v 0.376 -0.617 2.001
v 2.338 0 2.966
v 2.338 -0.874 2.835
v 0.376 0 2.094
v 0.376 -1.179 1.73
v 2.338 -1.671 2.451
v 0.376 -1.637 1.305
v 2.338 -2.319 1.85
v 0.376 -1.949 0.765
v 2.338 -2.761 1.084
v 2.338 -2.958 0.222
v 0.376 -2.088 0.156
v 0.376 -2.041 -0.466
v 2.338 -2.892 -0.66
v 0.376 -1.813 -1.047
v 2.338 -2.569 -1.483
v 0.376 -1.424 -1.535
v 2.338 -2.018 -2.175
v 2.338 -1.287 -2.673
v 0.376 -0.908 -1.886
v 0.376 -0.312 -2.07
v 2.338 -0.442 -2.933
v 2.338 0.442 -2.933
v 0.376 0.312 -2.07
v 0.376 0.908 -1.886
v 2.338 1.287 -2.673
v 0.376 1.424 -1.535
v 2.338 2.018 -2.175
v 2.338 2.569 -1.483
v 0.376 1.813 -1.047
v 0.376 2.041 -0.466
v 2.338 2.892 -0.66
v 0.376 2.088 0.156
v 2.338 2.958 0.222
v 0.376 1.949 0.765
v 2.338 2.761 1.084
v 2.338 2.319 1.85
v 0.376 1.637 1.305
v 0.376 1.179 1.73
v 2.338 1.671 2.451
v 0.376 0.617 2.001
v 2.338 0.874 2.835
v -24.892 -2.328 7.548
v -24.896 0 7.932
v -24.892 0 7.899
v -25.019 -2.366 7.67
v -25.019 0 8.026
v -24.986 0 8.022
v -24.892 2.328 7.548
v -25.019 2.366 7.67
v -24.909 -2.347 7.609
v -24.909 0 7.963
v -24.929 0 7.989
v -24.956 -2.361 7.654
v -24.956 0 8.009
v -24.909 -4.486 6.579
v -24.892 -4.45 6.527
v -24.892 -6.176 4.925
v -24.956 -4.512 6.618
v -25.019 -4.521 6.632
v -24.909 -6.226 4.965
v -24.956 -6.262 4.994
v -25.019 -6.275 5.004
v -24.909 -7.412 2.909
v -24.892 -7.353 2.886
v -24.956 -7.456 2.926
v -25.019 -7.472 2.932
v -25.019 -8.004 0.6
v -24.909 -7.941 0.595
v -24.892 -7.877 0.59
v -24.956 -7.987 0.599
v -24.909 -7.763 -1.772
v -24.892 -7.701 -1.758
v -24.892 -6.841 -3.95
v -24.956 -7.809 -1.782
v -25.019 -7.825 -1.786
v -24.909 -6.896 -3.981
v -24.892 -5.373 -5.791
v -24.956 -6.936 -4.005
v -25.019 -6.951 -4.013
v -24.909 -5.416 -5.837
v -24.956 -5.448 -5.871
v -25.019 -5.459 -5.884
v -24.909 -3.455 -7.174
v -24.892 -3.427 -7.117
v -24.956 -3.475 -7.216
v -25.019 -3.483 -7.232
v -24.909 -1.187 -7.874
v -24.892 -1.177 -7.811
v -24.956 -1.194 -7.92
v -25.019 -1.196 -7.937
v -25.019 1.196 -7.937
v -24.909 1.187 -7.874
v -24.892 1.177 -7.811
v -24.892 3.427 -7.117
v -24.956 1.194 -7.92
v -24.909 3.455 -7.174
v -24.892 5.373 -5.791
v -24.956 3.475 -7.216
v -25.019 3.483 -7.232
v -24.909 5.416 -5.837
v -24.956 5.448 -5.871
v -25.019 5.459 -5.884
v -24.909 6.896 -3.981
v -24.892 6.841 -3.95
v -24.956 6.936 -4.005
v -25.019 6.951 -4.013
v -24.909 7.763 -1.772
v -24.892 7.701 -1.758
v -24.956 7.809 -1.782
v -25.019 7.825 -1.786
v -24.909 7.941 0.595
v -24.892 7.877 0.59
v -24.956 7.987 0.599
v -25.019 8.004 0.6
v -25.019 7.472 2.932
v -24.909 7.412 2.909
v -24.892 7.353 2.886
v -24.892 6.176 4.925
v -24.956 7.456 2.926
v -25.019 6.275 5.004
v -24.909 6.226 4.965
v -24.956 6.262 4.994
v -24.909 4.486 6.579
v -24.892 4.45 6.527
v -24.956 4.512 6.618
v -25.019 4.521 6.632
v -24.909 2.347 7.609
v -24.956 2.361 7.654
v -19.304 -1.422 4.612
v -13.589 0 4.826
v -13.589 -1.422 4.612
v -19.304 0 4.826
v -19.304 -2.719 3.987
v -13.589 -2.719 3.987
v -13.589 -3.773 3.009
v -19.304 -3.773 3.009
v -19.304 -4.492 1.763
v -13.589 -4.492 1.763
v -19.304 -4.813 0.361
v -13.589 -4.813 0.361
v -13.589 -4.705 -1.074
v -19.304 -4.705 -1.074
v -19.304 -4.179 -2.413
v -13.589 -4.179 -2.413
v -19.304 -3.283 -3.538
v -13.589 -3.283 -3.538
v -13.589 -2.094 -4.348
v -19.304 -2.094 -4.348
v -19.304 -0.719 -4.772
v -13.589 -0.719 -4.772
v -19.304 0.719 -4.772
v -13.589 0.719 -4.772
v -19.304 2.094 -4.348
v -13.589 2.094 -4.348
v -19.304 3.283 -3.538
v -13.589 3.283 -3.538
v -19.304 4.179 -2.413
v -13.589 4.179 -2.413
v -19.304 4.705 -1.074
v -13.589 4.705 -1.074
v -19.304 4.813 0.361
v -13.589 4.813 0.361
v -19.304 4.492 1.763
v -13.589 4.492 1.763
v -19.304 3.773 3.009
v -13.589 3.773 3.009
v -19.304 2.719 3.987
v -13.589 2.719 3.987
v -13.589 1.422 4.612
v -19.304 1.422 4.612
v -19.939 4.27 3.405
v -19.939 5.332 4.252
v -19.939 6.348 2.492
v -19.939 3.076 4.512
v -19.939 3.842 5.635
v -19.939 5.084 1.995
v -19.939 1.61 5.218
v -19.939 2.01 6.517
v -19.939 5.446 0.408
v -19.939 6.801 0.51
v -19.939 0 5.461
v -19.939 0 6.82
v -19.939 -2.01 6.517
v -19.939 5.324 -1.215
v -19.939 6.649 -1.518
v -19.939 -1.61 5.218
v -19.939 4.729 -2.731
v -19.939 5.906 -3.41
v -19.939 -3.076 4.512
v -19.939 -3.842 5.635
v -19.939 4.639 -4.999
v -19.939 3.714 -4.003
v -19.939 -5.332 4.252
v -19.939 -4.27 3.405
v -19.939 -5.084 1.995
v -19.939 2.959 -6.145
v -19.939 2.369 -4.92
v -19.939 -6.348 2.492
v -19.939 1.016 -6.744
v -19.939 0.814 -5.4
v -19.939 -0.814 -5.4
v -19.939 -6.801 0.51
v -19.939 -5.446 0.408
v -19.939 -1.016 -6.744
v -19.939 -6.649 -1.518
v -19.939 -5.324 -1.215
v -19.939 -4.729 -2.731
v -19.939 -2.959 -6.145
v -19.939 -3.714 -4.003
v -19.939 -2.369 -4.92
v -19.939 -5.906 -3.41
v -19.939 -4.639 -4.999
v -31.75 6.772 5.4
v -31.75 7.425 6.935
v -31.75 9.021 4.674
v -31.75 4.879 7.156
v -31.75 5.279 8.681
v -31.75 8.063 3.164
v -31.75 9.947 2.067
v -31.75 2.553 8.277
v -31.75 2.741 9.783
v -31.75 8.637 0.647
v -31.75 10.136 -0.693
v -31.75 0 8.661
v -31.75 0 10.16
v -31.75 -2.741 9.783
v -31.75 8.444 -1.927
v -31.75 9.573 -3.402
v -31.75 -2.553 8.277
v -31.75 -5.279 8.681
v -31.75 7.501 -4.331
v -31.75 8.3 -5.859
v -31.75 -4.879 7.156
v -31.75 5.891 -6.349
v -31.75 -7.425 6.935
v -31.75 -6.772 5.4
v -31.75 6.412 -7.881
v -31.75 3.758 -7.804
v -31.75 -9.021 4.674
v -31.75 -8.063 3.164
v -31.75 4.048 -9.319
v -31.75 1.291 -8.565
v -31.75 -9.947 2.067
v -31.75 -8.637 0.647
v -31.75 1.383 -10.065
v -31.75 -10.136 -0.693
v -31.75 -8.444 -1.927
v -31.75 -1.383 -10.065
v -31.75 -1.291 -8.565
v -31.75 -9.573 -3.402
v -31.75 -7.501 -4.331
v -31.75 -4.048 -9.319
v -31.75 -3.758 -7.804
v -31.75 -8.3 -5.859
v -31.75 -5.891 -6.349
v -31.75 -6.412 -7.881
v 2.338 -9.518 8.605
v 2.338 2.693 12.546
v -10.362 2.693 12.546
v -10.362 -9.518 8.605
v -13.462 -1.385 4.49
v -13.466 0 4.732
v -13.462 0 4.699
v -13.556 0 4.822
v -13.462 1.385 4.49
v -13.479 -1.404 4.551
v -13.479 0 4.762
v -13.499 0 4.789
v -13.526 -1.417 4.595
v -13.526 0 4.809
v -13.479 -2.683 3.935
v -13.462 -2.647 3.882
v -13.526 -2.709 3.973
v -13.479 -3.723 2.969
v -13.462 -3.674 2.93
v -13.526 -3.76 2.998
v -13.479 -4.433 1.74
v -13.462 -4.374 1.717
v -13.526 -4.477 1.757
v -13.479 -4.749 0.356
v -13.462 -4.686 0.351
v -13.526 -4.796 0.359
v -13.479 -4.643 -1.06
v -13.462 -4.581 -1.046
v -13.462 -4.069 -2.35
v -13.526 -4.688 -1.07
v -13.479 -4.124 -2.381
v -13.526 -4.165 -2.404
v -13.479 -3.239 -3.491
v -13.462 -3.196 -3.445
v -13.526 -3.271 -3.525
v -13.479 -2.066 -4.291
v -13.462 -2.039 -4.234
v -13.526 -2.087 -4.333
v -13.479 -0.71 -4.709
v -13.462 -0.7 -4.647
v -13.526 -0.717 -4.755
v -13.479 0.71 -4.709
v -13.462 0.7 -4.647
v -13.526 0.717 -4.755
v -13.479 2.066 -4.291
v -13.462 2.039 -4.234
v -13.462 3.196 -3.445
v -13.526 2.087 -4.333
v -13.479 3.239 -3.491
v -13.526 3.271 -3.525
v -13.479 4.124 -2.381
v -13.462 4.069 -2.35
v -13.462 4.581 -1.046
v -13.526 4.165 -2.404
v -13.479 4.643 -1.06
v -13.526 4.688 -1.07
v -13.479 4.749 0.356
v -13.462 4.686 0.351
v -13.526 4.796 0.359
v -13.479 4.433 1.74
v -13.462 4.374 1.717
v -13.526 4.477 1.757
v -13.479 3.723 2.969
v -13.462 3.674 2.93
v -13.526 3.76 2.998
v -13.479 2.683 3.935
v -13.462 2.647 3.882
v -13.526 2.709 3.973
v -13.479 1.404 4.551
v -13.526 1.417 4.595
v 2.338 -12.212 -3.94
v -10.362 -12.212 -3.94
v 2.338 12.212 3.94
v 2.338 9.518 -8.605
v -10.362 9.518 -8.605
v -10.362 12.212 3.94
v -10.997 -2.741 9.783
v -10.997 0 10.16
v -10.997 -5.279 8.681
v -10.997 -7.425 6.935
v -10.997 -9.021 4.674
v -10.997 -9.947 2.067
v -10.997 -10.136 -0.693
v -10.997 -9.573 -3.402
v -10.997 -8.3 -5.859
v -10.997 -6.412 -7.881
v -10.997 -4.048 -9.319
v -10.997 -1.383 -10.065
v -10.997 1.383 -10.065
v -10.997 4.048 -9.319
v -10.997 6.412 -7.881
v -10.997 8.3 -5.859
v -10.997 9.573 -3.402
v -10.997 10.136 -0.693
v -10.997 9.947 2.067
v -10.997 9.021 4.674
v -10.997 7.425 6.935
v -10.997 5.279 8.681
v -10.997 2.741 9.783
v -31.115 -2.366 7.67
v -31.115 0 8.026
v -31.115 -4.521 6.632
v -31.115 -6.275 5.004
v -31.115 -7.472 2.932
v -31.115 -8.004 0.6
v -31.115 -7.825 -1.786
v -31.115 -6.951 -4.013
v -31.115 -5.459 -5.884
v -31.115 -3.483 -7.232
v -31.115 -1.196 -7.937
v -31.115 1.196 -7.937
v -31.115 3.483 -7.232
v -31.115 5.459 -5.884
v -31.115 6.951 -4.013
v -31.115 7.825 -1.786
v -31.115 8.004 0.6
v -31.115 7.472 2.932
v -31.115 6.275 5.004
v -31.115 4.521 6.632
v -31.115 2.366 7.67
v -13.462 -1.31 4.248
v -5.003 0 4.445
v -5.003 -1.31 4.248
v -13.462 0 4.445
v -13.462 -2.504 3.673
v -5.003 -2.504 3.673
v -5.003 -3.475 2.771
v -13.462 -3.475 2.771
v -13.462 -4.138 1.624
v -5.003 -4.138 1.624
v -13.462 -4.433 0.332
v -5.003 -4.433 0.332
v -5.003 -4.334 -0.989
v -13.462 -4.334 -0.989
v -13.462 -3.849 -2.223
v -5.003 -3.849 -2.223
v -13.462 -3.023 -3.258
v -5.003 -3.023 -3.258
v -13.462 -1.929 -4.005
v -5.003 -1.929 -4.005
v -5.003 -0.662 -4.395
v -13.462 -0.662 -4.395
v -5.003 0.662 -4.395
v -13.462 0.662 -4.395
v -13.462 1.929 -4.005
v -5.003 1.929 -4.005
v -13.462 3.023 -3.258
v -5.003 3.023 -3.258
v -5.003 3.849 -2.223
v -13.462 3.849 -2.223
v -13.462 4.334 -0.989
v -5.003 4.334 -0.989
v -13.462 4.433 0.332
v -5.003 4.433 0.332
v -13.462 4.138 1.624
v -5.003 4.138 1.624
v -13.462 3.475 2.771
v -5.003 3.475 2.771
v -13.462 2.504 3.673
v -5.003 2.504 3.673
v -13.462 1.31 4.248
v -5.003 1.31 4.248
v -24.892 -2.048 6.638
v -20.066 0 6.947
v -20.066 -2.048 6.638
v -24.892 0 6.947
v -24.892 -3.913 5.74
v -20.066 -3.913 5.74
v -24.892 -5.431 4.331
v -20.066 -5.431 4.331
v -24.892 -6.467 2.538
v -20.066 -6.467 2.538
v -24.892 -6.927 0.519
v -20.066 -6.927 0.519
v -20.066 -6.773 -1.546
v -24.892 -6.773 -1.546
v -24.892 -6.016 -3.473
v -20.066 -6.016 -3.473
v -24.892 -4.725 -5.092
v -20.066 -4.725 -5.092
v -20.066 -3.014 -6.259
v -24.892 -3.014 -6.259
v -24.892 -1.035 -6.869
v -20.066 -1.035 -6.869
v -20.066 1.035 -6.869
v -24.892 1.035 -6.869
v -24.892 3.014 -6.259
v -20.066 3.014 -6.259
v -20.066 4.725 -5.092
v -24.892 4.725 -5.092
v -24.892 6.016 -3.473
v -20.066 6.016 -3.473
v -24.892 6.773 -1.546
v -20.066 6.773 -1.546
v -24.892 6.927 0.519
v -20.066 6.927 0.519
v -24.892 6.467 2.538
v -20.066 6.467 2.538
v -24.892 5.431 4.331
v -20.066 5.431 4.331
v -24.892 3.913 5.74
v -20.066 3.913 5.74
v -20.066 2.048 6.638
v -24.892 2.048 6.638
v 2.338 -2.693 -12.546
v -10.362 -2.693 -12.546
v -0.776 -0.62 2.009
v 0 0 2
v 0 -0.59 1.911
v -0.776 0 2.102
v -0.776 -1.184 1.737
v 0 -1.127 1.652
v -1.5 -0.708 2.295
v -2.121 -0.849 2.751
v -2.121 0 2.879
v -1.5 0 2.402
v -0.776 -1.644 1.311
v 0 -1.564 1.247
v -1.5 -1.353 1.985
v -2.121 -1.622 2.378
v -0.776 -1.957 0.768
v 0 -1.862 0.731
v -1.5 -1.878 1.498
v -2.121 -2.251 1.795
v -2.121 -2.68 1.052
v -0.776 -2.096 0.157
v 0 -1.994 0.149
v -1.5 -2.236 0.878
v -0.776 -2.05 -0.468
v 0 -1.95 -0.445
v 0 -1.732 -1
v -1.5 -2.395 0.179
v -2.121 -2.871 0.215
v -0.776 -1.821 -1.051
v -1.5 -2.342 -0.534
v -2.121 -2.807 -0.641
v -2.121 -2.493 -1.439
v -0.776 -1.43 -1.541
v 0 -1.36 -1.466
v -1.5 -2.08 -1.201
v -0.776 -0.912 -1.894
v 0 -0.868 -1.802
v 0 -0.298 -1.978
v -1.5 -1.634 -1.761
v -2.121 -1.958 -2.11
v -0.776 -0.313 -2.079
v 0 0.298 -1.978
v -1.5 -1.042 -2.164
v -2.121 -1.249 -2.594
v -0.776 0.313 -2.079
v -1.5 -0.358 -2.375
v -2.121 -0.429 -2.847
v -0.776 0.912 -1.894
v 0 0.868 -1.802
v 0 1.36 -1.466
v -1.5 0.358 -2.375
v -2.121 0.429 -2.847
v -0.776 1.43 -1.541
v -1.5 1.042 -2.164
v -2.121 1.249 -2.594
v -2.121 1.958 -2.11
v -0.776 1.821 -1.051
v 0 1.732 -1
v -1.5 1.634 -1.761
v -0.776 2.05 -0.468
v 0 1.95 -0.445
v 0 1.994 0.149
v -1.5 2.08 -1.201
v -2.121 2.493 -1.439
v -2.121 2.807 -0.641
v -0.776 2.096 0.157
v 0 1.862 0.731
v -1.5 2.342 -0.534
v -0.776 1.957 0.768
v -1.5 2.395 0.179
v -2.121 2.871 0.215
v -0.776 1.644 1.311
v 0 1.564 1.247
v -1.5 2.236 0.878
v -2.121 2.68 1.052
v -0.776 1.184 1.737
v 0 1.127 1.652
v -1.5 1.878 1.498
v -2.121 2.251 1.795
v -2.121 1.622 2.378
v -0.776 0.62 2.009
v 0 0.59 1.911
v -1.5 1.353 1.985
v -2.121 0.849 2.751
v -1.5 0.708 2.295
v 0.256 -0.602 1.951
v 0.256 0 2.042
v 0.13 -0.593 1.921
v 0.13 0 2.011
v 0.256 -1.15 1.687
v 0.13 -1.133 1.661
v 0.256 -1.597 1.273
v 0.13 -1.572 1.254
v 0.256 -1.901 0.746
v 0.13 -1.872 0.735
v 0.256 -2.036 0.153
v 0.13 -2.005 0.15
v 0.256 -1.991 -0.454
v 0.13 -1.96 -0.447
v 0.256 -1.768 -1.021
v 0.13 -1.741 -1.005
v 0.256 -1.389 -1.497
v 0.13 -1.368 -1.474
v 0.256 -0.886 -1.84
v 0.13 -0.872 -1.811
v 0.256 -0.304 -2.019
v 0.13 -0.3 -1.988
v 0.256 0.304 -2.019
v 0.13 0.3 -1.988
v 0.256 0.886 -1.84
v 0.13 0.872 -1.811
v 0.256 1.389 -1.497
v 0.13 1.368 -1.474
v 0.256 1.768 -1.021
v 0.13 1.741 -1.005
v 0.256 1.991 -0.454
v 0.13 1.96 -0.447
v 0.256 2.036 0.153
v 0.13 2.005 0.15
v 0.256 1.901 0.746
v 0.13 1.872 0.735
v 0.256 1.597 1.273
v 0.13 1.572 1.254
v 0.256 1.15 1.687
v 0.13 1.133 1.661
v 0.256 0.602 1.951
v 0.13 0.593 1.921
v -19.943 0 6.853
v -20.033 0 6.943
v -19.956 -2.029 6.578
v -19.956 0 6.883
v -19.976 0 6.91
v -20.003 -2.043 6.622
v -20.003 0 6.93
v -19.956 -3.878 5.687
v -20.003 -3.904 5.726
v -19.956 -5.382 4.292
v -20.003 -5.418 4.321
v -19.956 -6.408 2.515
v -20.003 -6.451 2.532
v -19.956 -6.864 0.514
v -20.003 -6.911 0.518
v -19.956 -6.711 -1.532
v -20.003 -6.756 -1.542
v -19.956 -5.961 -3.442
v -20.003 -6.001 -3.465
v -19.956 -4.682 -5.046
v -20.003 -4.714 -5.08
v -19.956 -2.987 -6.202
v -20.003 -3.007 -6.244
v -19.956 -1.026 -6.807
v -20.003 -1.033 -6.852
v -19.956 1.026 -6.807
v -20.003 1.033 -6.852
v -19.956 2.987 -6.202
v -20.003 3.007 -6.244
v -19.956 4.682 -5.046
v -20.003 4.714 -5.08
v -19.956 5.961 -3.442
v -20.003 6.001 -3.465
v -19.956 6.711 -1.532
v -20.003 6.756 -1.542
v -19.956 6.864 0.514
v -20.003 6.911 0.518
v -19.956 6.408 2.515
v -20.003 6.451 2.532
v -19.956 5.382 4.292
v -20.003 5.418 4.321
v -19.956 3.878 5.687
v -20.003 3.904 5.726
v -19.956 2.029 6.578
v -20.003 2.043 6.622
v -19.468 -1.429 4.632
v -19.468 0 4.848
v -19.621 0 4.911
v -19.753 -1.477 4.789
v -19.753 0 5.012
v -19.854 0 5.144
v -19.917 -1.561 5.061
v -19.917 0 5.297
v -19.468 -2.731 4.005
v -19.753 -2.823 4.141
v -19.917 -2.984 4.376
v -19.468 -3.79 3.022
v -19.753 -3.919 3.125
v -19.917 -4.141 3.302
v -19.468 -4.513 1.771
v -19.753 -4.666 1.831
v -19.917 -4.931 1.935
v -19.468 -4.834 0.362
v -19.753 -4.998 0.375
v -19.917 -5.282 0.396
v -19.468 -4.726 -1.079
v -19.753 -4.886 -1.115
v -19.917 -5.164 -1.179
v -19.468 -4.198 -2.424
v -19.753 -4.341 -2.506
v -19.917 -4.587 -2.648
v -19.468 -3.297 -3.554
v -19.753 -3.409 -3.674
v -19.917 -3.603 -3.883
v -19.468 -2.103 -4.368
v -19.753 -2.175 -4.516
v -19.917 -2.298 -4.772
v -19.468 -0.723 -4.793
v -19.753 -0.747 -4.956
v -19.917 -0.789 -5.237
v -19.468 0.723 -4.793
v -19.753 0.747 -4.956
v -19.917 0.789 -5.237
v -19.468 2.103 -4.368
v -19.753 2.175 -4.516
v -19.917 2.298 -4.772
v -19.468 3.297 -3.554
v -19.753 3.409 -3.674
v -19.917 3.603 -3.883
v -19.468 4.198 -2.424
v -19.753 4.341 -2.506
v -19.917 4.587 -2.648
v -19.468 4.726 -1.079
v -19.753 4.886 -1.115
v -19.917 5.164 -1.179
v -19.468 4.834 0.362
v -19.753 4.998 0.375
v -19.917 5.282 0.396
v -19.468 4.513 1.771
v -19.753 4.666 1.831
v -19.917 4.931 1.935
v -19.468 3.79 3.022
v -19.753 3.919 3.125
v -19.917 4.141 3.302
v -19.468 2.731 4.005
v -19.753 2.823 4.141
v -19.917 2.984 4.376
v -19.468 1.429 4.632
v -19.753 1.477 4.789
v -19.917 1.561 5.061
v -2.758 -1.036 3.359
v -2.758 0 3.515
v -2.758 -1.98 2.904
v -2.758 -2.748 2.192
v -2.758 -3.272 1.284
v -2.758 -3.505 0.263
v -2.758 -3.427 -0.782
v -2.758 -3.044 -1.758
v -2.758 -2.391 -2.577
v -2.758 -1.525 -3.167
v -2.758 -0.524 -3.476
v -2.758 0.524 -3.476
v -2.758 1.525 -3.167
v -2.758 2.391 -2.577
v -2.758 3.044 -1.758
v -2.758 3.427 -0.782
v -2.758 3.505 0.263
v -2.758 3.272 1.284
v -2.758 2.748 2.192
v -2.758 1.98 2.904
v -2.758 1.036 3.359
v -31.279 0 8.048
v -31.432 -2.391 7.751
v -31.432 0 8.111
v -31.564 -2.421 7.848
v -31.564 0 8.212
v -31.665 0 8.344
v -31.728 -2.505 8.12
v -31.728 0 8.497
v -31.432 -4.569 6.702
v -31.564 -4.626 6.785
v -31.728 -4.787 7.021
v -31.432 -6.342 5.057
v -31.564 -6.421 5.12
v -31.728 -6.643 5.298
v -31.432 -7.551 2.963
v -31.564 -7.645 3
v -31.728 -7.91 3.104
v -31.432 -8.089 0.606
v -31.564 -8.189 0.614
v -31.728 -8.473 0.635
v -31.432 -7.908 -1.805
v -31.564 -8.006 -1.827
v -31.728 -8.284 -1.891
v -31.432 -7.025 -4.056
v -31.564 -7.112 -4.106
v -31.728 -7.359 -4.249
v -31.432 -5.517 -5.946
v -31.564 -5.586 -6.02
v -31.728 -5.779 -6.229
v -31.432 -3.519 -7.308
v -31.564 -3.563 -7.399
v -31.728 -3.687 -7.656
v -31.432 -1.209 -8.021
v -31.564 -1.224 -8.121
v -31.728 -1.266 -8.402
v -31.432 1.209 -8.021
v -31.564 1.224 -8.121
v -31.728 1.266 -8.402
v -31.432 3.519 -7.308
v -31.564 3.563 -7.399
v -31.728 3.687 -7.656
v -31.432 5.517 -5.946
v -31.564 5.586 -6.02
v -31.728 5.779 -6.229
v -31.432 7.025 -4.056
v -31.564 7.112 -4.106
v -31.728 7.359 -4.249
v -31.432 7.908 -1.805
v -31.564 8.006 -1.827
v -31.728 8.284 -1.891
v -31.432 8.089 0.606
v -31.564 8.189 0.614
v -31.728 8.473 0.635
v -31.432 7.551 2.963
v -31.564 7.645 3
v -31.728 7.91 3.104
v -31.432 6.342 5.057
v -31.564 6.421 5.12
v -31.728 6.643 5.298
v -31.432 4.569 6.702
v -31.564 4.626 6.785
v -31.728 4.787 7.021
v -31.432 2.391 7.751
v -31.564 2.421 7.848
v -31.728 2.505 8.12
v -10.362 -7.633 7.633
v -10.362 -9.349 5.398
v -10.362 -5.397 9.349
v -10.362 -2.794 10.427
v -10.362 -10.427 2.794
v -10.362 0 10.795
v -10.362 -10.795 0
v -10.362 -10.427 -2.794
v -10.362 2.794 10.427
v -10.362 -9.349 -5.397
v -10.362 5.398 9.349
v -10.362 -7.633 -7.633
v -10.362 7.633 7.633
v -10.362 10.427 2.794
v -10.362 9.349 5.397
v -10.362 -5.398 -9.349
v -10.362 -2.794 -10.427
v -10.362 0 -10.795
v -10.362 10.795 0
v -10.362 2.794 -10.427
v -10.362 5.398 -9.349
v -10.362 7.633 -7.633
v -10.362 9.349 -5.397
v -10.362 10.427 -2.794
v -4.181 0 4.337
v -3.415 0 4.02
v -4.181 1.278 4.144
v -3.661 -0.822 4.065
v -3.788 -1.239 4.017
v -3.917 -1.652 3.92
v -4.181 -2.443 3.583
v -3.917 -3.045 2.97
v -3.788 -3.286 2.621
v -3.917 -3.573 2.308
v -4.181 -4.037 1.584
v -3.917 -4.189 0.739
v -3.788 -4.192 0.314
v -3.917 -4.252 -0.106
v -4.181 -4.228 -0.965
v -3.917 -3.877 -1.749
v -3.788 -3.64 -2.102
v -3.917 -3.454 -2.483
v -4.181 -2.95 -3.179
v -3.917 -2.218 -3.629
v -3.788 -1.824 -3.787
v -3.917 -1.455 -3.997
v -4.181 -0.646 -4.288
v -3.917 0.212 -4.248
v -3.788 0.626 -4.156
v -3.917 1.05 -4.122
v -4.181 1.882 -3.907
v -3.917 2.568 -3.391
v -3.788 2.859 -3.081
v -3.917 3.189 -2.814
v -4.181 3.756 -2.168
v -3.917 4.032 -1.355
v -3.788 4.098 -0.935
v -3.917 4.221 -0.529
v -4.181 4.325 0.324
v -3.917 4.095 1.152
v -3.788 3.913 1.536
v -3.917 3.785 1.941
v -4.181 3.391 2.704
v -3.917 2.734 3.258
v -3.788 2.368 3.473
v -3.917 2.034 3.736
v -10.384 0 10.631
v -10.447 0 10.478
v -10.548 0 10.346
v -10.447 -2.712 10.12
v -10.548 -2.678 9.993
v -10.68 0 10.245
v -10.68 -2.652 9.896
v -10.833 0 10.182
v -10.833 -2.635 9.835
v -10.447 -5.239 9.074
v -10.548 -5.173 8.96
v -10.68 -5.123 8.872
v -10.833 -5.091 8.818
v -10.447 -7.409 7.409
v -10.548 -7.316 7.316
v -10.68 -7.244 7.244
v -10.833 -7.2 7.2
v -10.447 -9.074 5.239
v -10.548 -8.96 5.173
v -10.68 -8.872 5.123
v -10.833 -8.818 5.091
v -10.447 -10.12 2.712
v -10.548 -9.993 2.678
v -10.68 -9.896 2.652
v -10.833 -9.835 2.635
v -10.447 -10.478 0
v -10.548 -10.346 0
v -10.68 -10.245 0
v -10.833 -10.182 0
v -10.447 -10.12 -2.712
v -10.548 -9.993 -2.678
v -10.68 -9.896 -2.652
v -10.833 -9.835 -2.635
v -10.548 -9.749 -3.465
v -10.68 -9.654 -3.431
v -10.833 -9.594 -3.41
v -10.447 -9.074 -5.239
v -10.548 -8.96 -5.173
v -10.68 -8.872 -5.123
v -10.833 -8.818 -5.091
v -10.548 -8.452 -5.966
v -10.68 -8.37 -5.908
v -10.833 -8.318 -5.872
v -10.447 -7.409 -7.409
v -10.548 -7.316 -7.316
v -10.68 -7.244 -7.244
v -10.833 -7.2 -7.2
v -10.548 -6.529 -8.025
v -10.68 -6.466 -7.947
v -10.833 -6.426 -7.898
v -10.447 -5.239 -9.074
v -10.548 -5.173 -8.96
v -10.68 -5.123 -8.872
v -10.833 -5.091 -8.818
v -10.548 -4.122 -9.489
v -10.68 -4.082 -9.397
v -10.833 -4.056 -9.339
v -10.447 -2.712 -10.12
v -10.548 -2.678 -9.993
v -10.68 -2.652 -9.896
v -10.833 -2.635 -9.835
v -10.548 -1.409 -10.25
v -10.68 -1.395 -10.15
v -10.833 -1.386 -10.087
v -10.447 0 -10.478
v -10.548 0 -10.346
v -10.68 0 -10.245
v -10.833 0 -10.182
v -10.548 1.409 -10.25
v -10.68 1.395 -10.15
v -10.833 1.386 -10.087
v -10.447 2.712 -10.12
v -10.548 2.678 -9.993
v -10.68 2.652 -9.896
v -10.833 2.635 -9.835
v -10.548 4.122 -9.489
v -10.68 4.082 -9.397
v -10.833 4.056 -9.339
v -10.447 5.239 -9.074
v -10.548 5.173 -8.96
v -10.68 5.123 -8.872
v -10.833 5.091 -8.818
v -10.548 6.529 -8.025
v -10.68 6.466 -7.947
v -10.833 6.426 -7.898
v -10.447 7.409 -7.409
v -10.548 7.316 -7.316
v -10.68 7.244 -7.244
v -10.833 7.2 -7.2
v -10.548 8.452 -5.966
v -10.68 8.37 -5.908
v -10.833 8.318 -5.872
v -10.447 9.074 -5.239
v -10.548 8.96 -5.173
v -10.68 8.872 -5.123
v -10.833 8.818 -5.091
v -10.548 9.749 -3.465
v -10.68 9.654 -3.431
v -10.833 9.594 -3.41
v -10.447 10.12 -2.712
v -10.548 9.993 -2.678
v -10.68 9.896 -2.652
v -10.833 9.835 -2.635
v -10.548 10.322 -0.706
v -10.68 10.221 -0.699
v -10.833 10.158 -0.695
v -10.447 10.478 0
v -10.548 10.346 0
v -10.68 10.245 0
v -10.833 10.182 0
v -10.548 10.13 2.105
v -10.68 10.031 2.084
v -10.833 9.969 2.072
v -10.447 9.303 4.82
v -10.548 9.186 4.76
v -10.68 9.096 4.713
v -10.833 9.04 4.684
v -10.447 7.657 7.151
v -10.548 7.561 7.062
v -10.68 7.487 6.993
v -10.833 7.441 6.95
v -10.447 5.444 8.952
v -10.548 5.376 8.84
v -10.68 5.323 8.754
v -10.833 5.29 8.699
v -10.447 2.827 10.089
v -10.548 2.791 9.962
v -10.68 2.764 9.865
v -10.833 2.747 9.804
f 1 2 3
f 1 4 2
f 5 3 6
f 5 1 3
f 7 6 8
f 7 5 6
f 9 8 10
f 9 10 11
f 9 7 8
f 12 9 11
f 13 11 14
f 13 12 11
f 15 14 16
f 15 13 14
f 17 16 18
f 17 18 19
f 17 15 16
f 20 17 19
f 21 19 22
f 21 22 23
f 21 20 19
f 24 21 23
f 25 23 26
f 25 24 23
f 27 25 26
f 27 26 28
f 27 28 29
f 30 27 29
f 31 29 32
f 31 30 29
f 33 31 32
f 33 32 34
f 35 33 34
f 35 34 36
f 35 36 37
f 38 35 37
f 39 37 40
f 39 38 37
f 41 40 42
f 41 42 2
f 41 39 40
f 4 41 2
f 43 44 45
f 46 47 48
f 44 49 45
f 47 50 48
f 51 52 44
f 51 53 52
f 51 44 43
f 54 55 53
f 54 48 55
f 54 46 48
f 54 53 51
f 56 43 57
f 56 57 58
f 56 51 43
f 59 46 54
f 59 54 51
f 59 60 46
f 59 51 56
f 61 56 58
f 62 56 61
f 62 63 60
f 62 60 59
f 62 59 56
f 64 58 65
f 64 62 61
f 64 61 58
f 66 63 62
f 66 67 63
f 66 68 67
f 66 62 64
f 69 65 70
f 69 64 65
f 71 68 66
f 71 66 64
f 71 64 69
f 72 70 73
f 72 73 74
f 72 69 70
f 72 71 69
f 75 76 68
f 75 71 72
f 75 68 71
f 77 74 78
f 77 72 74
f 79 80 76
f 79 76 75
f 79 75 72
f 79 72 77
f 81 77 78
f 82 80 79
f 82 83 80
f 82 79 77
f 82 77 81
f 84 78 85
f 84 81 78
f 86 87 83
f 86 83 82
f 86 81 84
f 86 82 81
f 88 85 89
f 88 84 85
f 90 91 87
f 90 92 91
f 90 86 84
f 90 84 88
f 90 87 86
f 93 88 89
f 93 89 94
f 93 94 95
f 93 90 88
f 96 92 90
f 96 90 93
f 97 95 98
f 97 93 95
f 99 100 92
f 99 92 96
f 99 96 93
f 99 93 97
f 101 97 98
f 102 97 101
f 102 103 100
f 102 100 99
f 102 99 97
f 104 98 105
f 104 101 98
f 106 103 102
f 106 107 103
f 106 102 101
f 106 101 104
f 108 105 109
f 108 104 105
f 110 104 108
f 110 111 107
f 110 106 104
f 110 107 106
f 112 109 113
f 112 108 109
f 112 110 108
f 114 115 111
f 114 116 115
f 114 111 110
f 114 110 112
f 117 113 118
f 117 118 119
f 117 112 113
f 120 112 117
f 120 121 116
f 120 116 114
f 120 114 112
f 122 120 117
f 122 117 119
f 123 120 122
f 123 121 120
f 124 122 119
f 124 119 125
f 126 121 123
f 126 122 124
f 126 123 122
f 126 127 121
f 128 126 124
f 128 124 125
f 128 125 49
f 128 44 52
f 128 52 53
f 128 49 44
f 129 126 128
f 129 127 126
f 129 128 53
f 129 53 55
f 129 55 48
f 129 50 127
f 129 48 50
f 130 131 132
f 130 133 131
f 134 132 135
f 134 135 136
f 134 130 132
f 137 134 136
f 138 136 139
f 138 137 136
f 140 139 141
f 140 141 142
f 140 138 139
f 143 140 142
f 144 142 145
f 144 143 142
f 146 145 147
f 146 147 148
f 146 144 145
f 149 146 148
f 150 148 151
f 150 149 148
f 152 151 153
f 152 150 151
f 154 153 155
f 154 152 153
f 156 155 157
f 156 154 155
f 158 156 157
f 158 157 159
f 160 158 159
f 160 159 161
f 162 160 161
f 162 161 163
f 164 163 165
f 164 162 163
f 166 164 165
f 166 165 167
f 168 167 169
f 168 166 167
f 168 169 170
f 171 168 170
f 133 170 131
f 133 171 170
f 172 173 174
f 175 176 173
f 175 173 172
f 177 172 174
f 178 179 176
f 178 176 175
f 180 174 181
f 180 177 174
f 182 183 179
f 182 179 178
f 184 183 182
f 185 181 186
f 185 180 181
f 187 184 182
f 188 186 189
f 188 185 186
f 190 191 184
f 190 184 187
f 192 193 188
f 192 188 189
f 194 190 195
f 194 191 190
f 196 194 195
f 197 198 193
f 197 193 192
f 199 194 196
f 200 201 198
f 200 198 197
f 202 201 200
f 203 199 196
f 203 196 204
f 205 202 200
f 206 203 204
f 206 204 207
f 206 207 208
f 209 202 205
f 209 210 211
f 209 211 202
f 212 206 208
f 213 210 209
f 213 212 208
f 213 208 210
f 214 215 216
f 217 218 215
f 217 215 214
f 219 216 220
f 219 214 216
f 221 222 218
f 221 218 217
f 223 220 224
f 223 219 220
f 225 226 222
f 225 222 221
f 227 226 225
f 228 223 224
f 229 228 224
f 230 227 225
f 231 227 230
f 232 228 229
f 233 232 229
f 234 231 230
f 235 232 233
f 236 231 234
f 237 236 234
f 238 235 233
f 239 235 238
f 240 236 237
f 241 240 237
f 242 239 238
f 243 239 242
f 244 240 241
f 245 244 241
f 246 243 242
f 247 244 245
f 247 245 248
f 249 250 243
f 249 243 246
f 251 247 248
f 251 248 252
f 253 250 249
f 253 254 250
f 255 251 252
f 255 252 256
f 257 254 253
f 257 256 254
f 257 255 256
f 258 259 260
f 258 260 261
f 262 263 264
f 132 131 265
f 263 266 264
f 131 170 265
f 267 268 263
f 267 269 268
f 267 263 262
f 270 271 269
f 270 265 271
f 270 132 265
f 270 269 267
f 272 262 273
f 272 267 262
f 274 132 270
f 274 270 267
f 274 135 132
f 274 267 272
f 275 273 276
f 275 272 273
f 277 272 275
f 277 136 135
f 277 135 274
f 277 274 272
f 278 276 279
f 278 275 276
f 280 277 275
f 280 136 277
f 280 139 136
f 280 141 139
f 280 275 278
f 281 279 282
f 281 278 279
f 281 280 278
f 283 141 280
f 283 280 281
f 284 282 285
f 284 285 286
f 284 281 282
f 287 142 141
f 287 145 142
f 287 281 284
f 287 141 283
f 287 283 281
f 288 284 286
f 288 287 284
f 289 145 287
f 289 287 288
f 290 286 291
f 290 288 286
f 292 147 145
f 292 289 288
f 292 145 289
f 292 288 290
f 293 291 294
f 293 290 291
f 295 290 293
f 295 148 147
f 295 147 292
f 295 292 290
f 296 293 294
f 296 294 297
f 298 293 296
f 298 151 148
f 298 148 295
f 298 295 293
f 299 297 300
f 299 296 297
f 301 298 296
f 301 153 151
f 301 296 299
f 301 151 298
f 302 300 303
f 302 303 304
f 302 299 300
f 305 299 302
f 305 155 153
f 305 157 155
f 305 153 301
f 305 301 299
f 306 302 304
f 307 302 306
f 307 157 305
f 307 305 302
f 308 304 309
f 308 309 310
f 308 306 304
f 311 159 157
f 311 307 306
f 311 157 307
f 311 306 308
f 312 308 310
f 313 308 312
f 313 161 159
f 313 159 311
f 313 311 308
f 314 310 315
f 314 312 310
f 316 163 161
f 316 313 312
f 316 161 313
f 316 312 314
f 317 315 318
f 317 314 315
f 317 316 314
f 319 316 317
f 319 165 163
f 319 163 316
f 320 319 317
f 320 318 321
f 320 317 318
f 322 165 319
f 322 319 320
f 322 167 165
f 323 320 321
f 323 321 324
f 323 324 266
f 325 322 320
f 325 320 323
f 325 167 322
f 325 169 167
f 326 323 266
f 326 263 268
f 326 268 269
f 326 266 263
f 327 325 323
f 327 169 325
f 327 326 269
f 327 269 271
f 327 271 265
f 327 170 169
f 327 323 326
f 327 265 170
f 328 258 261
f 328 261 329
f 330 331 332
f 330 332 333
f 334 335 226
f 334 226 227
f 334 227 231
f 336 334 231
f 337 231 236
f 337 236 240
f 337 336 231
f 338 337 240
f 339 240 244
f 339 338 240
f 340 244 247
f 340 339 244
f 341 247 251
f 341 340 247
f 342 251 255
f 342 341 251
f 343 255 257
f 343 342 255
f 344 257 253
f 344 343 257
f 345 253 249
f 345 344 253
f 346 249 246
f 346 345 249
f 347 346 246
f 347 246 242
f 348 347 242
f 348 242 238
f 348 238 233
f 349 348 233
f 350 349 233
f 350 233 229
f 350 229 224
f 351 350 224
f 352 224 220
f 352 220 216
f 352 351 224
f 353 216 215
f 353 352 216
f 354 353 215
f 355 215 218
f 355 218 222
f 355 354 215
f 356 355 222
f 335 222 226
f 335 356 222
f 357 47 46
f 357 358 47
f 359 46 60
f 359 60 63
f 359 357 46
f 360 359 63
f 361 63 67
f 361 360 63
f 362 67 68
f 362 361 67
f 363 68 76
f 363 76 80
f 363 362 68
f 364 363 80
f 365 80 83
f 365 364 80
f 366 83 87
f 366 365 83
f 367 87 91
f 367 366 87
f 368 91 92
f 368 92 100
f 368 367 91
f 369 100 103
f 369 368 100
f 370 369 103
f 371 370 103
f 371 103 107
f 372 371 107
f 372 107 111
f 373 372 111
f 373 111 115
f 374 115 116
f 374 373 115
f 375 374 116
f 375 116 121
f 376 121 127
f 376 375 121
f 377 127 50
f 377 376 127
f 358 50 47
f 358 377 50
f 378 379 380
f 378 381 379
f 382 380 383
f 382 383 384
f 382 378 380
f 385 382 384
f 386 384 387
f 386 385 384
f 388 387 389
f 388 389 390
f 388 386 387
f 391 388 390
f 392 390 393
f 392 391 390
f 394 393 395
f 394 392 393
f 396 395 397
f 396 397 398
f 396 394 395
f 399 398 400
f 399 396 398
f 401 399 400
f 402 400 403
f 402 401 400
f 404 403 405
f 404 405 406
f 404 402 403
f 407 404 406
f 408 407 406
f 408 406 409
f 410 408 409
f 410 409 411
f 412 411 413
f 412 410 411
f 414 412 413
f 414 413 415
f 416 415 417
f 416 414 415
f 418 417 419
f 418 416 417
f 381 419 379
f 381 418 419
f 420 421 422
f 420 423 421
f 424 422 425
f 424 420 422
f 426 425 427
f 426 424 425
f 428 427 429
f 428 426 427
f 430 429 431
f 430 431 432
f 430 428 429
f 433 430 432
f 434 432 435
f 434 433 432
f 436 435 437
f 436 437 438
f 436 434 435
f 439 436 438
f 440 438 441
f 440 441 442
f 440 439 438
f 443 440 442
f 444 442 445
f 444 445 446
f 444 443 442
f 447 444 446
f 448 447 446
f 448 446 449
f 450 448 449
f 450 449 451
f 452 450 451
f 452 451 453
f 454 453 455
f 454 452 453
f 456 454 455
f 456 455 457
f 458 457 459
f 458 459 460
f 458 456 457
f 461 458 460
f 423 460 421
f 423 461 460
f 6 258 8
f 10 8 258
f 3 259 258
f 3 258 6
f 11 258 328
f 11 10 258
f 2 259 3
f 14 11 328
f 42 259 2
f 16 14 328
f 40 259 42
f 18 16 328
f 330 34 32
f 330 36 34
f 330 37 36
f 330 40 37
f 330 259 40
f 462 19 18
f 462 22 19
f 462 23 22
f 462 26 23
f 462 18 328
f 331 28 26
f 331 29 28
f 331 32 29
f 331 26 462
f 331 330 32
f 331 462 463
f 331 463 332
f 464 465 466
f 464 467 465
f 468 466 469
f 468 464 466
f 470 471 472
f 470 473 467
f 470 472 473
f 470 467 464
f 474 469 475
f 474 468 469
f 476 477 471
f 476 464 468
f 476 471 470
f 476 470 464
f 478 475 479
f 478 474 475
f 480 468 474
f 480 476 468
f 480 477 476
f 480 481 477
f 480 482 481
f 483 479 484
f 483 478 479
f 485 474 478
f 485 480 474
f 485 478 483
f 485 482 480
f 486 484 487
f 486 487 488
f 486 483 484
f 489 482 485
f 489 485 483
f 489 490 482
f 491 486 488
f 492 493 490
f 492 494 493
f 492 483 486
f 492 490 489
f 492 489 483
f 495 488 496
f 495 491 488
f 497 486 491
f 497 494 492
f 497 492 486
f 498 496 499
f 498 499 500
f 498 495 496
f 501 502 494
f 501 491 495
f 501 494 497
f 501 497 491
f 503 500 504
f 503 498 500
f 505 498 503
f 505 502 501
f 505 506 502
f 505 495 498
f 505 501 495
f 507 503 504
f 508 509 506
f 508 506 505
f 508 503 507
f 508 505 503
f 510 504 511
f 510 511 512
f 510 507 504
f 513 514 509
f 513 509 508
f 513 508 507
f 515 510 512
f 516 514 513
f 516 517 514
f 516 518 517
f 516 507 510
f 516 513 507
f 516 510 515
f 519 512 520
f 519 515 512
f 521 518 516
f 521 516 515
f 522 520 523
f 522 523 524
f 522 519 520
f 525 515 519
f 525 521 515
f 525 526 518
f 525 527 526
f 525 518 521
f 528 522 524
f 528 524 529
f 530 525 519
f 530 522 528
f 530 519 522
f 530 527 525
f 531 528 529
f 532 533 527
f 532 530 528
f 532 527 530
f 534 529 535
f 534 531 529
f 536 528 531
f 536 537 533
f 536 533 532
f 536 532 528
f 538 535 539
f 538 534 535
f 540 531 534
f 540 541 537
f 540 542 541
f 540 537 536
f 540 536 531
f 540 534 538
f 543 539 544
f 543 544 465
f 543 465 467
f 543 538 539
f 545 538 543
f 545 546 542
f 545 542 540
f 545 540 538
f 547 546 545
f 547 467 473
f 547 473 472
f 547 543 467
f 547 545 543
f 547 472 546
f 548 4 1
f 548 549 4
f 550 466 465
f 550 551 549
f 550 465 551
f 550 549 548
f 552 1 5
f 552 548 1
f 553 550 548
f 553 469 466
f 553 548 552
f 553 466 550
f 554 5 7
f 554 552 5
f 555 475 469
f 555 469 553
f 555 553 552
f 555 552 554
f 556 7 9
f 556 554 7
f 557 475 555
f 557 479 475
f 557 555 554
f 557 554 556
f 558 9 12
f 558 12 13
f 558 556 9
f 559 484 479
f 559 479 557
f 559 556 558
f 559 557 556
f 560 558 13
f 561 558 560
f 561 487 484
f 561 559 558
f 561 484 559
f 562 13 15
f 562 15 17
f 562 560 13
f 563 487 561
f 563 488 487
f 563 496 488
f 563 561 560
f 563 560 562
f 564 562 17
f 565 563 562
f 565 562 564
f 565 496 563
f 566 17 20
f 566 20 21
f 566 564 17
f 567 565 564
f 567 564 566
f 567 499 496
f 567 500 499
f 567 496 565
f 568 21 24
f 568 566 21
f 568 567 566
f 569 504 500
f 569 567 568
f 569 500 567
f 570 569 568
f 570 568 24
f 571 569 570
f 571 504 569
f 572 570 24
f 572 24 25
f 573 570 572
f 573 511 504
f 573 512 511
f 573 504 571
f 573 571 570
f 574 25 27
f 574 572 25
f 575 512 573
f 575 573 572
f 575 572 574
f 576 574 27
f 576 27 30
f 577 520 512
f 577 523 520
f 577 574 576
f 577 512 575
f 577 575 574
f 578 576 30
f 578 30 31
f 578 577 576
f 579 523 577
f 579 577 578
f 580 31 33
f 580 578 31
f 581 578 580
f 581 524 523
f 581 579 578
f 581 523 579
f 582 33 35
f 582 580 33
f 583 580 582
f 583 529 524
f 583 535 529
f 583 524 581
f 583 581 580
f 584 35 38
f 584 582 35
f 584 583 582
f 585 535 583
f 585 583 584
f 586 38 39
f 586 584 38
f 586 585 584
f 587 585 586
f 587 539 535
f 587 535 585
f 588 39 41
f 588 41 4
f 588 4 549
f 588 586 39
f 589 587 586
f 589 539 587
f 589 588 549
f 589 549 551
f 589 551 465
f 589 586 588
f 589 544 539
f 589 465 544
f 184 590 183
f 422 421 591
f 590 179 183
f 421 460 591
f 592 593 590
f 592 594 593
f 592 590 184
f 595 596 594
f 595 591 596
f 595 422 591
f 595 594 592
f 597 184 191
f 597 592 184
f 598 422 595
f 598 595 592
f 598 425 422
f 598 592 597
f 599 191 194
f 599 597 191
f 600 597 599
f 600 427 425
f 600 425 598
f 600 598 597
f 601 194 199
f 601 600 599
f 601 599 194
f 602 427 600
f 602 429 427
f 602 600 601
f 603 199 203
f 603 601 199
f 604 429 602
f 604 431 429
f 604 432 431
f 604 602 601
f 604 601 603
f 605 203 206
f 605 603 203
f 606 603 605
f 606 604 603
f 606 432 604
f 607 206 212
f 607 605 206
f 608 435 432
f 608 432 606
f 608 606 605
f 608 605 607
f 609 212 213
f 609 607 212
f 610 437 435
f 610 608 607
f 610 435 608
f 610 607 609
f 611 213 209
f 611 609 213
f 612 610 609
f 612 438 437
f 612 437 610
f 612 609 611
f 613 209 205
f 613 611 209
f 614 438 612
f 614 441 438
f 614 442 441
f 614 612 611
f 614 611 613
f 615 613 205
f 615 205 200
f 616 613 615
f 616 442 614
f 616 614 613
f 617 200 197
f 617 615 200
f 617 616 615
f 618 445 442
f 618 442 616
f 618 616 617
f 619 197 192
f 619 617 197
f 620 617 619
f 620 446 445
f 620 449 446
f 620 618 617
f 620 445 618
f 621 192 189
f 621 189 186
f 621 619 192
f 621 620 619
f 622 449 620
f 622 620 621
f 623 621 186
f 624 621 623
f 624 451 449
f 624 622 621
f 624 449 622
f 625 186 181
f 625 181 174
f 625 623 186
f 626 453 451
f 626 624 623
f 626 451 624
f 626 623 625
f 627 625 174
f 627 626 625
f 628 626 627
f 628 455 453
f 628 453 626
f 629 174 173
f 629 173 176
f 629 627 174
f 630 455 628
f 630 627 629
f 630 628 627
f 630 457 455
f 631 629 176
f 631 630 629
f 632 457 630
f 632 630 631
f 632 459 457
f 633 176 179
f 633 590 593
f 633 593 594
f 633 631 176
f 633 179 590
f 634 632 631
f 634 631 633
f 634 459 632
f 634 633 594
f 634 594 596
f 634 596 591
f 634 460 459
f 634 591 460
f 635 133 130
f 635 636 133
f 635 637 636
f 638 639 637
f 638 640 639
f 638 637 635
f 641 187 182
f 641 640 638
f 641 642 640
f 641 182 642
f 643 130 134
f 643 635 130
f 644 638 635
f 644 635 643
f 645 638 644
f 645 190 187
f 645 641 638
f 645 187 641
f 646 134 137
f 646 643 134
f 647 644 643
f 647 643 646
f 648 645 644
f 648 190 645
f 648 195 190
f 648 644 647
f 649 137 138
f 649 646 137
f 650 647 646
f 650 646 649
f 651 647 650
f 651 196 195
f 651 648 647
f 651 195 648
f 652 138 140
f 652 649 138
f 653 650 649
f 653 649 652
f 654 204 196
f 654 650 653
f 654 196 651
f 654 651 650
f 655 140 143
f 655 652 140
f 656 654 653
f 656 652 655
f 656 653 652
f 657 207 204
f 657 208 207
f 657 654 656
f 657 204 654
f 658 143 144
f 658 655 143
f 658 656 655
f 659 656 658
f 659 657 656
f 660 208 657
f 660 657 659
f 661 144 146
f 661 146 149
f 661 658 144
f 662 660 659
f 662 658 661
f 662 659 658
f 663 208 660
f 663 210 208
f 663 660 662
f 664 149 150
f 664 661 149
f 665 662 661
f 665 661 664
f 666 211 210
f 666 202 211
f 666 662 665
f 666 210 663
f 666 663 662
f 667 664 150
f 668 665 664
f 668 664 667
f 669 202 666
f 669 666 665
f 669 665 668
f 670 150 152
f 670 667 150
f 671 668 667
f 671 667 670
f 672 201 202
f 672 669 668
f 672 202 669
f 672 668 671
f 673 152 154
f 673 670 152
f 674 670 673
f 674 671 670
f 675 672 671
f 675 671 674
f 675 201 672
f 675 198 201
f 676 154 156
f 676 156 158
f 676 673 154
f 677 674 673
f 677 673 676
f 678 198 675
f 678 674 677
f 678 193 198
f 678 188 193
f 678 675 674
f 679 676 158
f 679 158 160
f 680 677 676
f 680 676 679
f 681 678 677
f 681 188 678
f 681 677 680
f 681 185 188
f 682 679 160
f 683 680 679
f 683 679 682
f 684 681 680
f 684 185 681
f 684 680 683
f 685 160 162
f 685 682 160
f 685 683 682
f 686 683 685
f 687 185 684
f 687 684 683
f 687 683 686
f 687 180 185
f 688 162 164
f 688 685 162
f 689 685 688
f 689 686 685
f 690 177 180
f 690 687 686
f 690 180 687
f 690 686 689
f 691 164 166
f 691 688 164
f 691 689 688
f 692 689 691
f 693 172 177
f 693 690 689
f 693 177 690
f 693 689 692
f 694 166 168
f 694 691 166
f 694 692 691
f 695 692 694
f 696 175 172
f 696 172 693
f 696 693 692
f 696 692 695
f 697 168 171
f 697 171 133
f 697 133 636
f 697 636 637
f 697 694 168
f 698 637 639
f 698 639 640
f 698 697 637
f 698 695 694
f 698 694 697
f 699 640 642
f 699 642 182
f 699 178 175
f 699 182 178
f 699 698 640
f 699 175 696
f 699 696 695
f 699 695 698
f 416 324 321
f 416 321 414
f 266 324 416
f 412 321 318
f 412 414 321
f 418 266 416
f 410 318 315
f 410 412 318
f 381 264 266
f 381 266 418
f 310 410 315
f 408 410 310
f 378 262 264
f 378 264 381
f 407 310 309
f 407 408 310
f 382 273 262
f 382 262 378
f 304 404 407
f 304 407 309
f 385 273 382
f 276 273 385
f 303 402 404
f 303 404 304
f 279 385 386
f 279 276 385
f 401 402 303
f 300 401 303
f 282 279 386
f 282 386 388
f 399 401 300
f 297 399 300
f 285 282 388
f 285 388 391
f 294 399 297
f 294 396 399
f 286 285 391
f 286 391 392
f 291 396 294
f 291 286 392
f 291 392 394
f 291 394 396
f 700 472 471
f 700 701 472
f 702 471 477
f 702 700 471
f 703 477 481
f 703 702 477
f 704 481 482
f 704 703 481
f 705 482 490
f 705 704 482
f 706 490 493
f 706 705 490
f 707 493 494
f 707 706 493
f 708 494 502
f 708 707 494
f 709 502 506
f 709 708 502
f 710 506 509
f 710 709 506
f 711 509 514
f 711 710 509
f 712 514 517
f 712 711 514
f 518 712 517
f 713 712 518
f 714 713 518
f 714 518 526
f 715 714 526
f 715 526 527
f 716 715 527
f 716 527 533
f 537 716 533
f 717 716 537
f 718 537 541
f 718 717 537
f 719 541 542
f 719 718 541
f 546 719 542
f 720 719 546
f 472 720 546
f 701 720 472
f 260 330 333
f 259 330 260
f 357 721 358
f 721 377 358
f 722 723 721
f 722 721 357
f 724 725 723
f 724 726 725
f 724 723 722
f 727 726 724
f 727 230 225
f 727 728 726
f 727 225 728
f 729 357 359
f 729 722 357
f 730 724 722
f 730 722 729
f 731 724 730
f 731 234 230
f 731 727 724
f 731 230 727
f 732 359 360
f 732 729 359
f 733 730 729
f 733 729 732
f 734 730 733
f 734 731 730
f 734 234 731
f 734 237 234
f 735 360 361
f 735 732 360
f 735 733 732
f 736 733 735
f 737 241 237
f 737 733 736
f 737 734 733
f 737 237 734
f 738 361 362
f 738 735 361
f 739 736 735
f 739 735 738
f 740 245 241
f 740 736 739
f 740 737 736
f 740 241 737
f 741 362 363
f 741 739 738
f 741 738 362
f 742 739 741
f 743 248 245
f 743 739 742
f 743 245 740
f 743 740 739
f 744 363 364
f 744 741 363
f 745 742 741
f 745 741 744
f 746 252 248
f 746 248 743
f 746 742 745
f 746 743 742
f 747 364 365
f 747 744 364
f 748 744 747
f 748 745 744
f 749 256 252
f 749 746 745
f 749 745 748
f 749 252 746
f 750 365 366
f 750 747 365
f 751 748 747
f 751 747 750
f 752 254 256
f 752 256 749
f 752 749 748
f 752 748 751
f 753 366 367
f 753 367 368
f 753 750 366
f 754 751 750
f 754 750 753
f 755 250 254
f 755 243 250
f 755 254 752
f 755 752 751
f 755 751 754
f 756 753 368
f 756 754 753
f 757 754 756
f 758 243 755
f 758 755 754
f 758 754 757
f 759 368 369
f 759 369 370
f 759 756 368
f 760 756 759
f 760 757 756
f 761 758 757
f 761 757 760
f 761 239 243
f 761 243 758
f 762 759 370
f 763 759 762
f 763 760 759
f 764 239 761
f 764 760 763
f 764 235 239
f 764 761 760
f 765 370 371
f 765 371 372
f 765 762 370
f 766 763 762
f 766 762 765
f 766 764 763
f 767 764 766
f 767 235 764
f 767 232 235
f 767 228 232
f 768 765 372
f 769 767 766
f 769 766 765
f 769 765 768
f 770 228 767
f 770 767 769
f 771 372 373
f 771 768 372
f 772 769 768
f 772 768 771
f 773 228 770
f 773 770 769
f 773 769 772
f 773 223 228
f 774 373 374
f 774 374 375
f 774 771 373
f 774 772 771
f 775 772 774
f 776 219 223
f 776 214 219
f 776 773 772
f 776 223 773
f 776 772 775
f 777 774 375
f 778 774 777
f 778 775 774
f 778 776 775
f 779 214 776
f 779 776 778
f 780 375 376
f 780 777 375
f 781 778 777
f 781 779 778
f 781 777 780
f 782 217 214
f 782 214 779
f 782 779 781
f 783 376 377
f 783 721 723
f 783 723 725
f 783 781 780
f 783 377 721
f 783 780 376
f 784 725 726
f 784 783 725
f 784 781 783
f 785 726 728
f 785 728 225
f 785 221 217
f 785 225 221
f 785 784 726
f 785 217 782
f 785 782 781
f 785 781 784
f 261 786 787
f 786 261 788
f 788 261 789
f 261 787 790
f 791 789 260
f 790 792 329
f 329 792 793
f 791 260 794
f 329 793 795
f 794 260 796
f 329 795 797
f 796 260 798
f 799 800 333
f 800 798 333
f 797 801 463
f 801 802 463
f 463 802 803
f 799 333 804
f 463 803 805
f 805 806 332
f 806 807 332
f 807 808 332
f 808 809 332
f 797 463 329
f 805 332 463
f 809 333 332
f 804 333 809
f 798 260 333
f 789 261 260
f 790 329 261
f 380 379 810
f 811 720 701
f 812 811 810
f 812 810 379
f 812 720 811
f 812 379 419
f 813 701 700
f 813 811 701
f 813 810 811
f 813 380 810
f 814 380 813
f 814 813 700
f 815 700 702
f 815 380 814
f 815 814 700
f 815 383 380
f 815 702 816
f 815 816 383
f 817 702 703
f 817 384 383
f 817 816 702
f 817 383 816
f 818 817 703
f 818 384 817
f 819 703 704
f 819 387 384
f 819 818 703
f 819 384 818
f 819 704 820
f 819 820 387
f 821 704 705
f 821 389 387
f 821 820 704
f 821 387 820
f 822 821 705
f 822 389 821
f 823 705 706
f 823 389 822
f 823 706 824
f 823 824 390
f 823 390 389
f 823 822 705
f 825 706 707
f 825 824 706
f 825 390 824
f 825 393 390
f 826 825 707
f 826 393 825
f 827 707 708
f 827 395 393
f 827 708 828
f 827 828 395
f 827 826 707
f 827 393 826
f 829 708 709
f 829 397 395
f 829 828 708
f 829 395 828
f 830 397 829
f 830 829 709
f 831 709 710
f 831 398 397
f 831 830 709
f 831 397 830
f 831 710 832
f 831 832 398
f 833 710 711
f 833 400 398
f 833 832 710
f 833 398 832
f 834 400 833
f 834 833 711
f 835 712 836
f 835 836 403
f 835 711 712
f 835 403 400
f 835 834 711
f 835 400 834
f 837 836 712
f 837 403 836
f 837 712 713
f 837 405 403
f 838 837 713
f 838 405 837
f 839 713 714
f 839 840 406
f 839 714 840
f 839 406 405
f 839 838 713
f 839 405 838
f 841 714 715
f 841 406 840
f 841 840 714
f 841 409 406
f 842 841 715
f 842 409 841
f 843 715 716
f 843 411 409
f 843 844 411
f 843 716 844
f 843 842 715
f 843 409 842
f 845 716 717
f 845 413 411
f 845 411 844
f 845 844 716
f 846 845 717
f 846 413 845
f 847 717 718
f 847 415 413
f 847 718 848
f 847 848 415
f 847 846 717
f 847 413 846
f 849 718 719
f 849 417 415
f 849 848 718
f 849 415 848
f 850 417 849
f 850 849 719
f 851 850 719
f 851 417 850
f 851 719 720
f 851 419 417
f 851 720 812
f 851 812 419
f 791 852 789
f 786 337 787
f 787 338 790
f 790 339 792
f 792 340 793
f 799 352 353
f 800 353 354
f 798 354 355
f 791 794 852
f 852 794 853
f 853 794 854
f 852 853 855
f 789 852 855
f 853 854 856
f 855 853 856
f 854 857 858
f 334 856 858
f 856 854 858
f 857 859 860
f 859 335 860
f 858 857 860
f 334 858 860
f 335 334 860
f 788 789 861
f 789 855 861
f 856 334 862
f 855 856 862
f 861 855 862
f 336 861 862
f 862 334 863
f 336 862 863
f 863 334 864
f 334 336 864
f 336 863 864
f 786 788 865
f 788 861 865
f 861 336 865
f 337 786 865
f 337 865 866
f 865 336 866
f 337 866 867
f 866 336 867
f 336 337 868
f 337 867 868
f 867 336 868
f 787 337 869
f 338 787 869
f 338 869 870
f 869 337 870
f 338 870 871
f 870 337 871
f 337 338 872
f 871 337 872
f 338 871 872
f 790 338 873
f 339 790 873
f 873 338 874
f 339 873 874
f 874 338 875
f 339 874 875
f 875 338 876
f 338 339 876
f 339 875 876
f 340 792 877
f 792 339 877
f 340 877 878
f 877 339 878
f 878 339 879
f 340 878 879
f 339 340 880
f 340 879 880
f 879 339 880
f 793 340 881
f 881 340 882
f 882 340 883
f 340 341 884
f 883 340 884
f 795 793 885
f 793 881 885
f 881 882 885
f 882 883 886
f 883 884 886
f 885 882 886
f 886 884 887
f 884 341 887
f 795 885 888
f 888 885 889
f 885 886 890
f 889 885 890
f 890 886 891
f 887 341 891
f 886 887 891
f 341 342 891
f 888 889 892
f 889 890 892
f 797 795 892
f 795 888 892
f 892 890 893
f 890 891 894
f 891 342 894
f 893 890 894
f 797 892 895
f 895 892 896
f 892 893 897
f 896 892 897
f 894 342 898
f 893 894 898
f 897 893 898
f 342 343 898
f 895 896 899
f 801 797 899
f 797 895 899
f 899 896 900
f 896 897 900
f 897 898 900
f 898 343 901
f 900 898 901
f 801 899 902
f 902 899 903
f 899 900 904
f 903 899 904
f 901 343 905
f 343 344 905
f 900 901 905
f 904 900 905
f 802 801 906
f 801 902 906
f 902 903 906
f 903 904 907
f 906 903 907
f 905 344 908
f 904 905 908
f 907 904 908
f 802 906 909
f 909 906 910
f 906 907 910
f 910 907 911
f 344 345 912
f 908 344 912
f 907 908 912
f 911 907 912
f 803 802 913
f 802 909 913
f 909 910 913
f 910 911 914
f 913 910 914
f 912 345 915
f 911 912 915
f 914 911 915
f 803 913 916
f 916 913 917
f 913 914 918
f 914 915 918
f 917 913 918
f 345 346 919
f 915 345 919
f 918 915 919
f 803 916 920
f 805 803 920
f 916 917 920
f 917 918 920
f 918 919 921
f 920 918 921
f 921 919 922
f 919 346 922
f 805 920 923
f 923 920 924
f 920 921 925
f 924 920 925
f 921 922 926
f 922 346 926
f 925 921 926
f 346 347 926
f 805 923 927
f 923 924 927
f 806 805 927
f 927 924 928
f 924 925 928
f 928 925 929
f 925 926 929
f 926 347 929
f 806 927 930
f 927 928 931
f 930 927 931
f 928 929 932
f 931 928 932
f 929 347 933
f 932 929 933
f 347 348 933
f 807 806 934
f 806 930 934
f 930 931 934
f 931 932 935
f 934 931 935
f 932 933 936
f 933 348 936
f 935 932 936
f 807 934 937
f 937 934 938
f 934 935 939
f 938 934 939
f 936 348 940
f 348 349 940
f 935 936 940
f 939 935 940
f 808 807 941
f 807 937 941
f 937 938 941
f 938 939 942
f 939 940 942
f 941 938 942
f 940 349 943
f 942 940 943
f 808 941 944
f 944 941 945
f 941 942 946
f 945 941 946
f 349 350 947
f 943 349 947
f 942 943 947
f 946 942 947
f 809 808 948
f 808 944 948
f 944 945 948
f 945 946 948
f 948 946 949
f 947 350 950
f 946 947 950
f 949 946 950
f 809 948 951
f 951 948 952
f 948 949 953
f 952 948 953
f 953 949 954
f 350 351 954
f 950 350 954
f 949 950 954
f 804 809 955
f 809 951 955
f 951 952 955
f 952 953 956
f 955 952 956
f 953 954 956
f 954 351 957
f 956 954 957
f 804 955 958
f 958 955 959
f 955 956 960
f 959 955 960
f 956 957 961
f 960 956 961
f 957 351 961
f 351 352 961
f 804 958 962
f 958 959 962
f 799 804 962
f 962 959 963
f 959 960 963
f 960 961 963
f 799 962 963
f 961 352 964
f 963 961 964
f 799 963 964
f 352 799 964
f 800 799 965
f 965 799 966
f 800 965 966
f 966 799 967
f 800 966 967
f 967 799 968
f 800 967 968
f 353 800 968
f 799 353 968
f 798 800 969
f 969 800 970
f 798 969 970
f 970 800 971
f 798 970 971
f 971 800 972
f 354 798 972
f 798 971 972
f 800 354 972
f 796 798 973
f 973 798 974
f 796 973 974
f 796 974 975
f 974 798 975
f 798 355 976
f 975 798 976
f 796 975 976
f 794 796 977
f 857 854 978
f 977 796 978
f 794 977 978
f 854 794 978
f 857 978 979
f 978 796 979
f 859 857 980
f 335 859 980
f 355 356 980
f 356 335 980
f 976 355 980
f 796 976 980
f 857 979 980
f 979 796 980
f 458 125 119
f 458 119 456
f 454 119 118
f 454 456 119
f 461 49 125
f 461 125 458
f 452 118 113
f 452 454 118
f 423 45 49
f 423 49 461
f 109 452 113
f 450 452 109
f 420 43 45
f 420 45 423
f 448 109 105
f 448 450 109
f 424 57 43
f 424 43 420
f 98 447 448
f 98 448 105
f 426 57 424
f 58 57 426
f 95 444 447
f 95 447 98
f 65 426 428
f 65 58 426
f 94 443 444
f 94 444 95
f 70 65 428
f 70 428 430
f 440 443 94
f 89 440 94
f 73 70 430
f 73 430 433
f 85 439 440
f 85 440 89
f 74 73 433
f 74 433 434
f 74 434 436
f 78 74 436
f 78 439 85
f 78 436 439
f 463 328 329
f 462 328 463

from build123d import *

# Parameters (mm, degrees)
SKETCH4_R           = 10.16
BOSS_EXTRUDE1_DEPTH = 12.7
FILLET1_R           = 0.635


with BuildPart() as part:
    # Sketch1 → Revolve1 (revolve)
    with BuildSketch(Plane.XY, mode=Mode.PRIVATE) as revolve1_sk:
        with BuildLine():
            Line((-2.121320344, 2.878679656), (-2.757704717, 3.51506403))
            ThreePointArc((-2.757704717, 3.51506403), (-3.78774885, 4.203317516), (-5.002768748, 4.445))
            Line((-5.002768748, 4.445), (-13.462, 4.445))
            Line((-13.462, 4.445), (-13.462, 4.699))
            ThreePointArc((-13.462, 4.699), (-13.499197439, 4.788802561), (-13.589, 4.826))
            Line((-13.589, 4.826), (-19.304, 4.826))
            ThreePointArc((-19.304, 4.826), (-19.753012806, 5.011987194), (-19.939, 5.461))
            Line((-19.939, 5.461), (-19.939, 6.8199))
            ThreePointArc((-19.939, 6.8199), (-19.976197439, 6.909702561), (-20.066, 6.9469))
            Line((-20.066, 6.9469), (-24.892, 6.9469))
            Line((-24.892, 6.9469), (-24.892, 7.8994))
            ThreePointArc((-24.892, 7.8994), (-24.929197439, 7.989202561), (-25.019, 8.0264))
            Line((-25.019, 8.0264), (-31.115, 8.0264))
            ThreePointArc((-31.115, 8.0264), (-31.564012806, 8.212387194), (-31.75, 8.6614))
            Line((-31.75, 8.6614), (-31.75, 10.16))
            Line((-31.75, 10.16), (-10.362192304, 10.16))
            Line((-10.362192304, 10.16), (2.337807696, 10.16))
            Line((2.337807696, 10.16), (2.337807696, 2.966479395))
            add(Edge.make_bspline(
                [(2.337807696, 2.966479395), (1.321354961, 2.596520855), (0.37557725, 2.093641926)],
                knots=[0, 0, 0, 1, 1, 1], degree=2))
            ThreePointArc((0.37557725, 2.093641926), (0.193537516, 2.023763419), (0, 2))
            ThreePointArc((0, 2), (-1.148050297, 2.228361402), (-2.121320344, 2.878679656))
        make_face()
    revolve(revolve1_sk.sketch.rotate(Axis((0, 0, 0), (1, 0, 0)), 90), axis=Axis((0, 0, 0), (1, 0, 0)))

    # Sketch4 → Boss-Extrude1 (add)
    with BuildSketch(Plane(origin=(2.337807696, 0, 0), x_dir=(0, 0, -1), z_dir=(1, 0, 0))):
        Polygon((3.940411868, -12.211607701), (12.545768424, -2.693307071), (8.605356556, 9.51830063), (-3.940411868, 12.211607701), (-12.545768424, 2.693307071), (-8.605356556, -9.51830063), align=None)
        with Locations(Location((0, 0, 0), (0, 0, 180))):
            Circle(SKETCH4_R, mode=Mode.SUBTRACT)
    extrude(amount=-BOSS_EXTRUDE1_DEPTH)

    # Fillet1
    fillet1_edges = [part.edges().sort_by_distance(p)[0] for p in [
        (-10.362192304, 0, -10.16),
    ]]
    fillet(fillet1_edges, radius=FILLET1_R)


solid = part.part
